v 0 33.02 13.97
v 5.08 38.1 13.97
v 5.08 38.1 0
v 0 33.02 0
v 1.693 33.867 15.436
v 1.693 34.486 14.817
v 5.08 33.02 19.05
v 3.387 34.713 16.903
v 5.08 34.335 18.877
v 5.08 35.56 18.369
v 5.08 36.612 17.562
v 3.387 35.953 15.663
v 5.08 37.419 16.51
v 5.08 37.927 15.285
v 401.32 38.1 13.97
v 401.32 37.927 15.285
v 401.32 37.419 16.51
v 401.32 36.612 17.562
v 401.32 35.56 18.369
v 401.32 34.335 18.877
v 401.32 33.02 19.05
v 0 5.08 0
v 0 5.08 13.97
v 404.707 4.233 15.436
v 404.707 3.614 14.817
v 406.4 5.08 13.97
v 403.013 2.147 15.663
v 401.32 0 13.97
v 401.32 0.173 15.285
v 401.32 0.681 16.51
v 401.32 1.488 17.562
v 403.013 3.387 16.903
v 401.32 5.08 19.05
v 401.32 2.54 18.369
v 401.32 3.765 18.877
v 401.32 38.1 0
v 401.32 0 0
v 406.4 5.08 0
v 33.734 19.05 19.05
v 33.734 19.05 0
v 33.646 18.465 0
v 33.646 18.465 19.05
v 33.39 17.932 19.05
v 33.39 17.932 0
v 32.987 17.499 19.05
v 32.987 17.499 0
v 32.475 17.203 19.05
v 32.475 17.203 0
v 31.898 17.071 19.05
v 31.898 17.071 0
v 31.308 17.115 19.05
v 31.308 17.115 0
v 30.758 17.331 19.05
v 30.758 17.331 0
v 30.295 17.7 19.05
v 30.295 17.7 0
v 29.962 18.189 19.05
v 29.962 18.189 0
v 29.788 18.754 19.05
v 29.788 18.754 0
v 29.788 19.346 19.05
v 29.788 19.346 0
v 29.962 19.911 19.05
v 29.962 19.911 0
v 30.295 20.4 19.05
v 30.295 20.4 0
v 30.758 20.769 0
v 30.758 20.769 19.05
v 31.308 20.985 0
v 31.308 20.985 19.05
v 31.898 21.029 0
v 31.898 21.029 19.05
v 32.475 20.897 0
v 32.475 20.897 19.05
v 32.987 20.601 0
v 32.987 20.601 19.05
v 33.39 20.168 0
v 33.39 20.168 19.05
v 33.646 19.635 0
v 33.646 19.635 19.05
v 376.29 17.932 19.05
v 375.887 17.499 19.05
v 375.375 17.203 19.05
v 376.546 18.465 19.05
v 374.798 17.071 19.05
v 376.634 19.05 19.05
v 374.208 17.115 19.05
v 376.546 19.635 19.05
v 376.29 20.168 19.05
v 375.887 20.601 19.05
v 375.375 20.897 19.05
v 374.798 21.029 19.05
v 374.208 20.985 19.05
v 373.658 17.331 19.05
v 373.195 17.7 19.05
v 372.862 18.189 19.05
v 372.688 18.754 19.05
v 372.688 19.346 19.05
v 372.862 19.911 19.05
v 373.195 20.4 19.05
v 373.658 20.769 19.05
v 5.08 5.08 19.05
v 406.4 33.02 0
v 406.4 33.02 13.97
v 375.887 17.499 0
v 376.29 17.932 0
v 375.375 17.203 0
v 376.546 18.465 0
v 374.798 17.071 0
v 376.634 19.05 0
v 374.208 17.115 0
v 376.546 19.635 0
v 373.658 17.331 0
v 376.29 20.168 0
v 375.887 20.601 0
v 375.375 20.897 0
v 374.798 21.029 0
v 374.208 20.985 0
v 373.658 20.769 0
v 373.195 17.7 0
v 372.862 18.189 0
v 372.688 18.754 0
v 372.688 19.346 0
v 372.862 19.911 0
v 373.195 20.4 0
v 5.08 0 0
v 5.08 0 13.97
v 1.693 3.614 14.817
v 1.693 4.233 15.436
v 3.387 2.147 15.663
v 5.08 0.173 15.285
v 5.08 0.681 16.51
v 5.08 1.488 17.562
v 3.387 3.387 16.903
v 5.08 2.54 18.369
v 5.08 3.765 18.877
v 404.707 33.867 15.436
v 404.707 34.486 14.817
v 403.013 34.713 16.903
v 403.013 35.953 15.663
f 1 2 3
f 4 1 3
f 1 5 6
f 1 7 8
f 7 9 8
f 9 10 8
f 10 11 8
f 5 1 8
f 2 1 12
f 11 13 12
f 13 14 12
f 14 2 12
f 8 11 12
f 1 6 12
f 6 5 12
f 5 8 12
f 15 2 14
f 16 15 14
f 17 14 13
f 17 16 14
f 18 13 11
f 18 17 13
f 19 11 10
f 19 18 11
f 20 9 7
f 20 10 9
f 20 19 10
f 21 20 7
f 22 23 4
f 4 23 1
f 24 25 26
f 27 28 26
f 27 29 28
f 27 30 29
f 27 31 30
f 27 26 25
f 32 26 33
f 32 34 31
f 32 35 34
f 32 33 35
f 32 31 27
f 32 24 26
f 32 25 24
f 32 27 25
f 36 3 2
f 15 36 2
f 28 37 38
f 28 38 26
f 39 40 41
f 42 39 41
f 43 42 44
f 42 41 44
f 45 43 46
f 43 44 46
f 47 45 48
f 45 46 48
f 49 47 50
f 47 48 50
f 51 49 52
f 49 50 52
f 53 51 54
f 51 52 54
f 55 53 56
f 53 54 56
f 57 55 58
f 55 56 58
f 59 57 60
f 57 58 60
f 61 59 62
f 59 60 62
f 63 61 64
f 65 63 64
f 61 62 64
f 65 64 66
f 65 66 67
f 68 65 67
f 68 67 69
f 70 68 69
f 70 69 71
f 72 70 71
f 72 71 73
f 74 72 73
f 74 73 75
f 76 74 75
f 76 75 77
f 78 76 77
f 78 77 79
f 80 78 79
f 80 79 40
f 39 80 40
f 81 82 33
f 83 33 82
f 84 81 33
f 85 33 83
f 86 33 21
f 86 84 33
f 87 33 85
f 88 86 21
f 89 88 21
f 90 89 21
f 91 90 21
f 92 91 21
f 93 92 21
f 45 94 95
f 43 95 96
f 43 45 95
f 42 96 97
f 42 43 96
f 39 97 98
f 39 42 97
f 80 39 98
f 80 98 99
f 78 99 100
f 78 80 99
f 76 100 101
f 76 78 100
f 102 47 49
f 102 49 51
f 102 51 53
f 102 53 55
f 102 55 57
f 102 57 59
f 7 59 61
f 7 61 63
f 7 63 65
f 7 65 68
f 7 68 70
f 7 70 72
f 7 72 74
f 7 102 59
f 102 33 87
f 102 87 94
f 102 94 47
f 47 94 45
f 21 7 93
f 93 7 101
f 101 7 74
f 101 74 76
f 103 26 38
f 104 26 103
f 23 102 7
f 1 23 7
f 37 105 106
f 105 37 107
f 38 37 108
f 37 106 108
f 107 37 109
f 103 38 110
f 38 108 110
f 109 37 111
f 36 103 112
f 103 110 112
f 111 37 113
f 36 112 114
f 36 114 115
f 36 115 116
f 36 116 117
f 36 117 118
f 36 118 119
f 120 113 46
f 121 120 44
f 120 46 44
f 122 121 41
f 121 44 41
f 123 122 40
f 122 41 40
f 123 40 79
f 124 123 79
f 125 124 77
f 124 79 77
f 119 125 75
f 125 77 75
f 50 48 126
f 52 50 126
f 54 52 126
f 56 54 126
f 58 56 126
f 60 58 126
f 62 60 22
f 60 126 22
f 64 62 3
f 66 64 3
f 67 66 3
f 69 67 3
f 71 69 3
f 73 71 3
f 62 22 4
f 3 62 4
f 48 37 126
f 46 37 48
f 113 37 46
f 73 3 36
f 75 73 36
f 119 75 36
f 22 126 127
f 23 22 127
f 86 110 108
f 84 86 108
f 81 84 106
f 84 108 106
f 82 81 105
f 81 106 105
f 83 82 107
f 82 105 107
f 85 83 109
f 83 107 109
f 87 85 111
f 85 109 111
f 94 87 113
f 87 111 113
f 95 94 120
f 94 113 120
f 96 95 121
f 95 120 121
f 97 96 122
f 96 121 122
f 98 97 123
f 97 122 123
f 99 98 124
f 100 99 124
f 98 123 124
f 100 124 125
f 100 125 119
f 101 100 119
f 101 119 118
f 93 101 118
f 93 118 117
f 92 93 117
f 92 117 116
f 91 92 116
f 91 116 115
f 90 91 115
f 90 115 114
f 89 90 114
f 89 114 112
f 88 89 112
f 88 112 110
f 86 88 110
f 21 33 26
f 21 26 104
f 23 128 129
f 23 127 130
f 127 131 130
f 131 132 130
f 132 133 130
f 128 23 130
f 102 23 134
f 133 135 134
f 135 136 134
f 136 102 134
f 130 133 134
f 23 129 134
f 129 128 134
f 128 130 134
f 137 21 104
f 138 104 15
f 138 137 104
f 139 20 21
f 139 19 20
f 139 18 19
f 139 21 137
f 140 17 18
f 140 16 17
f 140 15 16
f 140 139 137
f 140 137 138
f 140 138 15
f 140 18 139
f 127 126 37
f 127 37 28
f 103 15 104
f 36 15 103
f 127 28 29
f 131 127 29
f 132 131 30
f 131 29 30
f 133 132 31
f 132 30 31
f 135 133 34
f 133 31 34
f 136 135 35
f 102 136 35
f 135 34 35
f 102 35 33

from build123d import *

# Parameters (mm, degrees)
F0_W     = 38.1
F0_H     = 19.05
F1_DEPTH = 406.4
F2_R     = 5.08
F3_SIZE  = 5.08
F4_R     = 1.984375
F5_DEPTH = 25.4


with BuildPart() as f1:
    # F0 (on Right) → F1 (new body)
    with BuildSketch(Plane.YZ):
        with Locations((19.05, 9.525)):
            Rectangle(F0_W, F0_H)
    extrude(amount=F1_DEPTH)

    # F2
    f2_edges = [f1.edges().sort_by_distance(p)[0] for p in [
        (203.2, 0, 19.05),
        (203.2, 38.1, 19.05),
    ]]
    fillet(f2_edges, radius=F2_R)

    # F3
    f3_edges = [f1.edges().sort_by_distance(p)[0] for p in [
        (406.4, 19.05, 19.05),
        (0, 19.05, 19.05),
    ]]
    chamfer(f3_edges, length=F3_SIZE)

    # F4 (on face) → F5 (cut)
    with BuildSketch(Plane(origin=(0, 0, 0), x_dir=(1, 0, 0), z_dir=(0, 0, -1))):
        with Locations((31.75, -19.05)):
            Circle(F4_R)
        with Locations((374.65, -19.05)):
            Circle(F4_R)
    extrude(amount=-F5_DEPTH, mode=Mode.SUBTRACT)


solid = f1.part
